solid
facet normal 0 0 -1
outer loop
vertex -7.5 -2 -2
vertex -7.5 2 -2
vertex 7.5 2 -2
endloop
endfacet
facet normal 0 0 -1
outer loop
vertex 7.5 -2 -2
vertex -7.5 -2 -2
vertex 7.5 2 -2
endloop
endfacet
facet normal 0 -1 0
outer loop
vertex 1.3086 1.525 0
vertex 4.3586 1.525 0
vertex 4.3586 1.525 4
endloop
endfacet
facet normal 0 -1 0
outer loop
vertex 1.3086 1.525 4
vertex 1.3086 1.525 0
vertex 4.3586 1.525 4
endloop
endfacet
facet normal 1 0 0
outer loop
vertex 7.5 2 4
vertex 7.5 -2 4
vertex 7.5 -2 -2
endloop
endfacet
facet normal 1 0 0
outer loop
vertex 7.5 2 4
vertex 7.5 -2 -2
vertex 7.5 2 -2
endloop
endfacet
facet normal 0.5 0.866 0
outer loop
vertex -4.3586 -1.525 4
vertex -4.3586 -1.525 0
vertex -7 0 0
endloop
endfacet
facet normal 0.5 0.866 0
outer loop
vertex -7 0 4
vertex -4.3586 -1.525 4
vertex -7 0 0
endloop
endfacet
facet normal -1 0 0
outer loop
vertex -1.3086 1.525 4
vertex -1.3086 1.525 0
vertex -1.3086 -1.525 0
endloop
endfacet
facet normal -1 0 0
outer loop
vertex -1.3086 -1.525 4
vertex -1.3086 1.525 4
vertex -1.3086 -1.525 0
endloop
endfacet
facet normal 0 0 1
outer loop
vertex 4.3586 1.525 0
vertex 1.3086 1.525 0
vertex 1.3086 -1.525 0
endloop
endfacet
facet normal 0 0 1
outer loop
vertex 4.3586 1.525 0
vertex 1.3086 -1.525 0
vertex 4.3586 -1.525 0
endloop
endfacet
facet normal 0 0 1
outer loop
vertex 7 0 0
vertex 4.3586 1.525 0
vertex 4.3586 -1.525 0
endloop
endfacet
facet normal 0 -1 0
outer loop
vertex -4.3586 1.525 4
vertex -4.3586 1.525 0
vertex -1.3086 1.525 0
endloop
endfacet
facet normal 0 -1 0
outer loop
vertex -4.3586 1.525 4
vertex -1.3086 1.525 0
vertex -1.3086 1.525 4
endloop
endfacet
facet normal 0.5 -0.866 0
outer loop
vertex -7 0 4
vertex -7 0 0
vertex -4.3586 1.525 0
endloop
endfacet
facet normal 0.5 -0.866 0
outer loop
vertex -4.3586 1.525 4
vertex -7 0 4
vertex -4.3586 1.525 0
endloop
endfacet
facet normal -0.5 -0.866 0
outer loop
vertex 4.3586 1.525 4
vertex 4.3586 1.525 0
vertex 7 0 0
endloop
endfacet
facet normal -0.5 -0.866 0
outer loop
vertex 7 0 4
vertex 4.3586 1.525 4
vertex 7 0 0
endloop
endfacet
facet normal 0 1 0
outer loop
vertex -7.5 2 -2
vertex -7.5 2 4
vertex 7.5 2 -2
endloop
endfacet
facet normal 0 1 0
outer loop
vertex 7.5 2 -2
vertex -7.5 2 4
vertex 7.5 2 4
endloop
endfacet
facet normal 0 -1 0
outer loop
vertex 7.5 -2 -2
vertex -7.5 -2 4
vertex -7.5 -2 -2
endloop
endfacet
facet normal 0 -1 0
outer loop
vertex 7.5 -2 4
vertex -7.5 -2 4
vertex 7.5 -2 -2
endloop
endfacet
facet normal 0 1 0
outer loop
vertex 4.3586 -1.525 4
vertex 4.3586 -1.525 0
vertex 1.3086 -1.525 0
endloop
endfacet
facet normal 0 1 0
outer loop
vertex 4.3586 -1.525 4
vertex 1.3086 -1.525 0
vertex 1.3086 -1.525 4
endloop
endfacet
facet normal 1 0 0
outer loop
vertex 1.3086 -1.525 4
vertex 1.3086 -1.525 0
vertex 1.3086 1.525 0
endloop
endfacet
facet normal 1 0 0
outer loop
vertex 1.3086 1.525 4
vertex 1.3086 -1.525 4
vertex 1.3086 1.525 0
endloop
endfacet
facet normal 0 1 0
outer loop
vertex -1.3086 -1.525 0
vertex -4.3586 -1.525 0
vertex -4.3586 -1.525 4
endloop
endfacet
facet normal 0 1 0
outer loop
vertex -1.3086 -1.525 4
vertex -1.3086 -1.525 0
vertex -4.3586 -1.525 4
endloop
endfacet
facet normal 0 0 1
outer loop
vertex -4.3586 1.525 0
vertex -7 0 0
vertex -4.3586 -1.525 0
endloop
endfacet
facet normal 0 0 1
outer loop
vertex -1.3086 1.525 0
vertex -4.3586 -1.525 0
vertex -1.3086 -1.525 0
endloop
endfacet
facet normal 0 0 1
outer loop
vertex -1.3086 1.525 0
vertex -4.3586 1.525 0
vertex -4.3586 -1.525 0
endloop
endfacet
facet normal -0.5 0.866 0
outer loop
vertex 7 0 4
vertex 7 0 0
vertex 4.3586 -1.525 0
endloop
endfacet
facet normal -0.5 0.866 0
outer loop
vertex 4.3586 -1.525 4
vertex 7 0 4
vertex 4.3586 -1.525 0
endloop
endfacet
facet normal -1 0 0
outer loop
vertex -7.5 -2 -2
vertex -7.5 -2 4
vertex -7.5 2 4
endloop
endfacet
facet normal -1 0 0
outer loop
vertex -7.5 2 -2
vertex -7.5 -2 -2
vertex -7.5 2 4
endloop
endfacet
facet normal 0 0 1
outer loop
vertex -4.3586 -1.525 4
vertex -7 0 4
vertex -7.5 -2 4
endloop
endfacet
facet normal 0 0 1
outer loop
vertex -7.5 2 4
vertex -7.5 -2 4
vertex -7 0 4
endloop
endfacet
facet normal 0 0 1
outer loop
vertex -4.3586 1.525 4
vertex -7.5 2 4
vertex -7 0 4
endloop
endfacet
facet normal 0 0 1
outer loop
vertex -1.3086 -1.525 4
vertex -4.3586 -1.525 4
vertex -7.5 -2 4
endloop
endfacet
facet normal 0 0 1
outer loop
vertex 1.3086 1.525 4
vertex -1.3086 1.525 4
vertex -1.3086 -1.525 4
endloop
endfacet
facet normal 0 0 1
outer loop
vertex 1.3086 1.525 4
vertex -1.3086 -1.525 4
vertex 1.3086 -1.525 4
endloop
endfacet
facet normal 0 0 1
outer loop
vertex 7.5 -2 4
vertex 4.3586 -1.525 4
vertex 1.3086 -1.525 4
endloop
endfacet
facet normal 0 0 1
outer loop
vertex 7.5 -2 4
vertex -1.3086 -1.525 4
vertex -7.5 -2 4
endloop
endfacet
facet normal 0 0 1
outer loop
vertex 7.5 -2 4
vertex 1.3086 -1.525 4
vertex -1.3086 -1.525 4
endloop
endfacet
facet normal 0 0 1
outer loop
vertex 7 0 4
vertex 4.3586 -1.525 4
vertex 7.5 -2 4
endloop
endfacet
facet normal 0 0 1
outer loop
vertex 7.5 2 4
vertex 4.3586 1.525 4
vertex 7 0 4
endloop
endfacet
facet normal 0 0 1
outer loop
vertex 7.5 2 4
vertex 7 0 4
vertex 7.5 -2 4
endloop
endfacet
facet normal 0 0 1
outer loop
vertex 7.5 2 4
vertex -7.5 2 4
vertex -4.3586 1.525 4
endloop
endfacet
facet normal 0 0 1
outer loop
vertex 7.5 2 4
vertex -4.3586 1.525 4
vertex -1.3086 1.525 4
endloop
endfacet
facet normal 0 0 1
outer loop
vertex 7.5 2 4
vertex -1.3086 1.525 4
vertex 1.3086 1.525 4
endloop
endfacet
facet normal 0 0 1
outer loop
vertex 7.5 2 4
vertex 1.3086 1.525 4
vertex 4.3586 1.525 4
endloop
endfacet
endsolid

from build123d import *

# Parameters (mm, degrees)
F0_W     = 15
F0_H     = 4
F1_DEPTH = 4
F2_DEPTH = 2
F3_DEPTH = 3.05
F4_DEPTH = 3.05


with BuildPart() as f1:
    # F0 (on Top) → F1 (new body)
    with BuildSketch(Plane.XY):
        Rectangle(F0_W, F0_H)
        Polygon((-4.3586225185, -1.525), (-7, 0), (-4.3586225185, 1.525), align=None, mode=Mode.SUBTRACT)
        Polygon((4.3586225185, 1.525), (7, 0), (4.3586225185, -1.525), align=None, mode=Mode.SUBTRACT)
    extrude(amount=F1_DEPTH)

    # F0 (on Top) → F2 (join)
    with BuildSketch(Plane.XY):
        Rectangle(F0_W, F0_H)
        Polygon((-4.3586225185, -1.525), (-7, 0), (-4.3586225185, 1.525), align=None, mode=Mode.SUBTRACT)
        Polygon((4.3586225185, 1.525), (7, 0), (4.3586225185, -1.525), align=None, mode=Mode.SUBTRACT)
        Polygon((-4.3586225185, 1.525), (-7, 0), (-4.3586225185, -1.525), align=None)
        Polygon((4.3586225185, -1.525), (7, 0), (4.3586225185, 1.525), align=None)
    extrude(amount=-F2_DEPTH)

    # F3 (cut): a face of the model
    f3_faces = [f1.faces().sort_by_distance(p)[0] for p in [
        (4.3586225185, 0, 2),
    ]]
    extrude(f3_faces, amount=-F3_DEPTH, mode=Mode.SUBTRACT)

    # F4 (cut): a face of the model
    f4_faces = [f1.faces().sort_by_distance(p)[0] for p in [
        (-4.3586225185, 0, 2),
    ]]
    extrude(f4_faces, amount=-F4_DEPTH, mode=Mode.SUBTRACT)


solid = f1.part
